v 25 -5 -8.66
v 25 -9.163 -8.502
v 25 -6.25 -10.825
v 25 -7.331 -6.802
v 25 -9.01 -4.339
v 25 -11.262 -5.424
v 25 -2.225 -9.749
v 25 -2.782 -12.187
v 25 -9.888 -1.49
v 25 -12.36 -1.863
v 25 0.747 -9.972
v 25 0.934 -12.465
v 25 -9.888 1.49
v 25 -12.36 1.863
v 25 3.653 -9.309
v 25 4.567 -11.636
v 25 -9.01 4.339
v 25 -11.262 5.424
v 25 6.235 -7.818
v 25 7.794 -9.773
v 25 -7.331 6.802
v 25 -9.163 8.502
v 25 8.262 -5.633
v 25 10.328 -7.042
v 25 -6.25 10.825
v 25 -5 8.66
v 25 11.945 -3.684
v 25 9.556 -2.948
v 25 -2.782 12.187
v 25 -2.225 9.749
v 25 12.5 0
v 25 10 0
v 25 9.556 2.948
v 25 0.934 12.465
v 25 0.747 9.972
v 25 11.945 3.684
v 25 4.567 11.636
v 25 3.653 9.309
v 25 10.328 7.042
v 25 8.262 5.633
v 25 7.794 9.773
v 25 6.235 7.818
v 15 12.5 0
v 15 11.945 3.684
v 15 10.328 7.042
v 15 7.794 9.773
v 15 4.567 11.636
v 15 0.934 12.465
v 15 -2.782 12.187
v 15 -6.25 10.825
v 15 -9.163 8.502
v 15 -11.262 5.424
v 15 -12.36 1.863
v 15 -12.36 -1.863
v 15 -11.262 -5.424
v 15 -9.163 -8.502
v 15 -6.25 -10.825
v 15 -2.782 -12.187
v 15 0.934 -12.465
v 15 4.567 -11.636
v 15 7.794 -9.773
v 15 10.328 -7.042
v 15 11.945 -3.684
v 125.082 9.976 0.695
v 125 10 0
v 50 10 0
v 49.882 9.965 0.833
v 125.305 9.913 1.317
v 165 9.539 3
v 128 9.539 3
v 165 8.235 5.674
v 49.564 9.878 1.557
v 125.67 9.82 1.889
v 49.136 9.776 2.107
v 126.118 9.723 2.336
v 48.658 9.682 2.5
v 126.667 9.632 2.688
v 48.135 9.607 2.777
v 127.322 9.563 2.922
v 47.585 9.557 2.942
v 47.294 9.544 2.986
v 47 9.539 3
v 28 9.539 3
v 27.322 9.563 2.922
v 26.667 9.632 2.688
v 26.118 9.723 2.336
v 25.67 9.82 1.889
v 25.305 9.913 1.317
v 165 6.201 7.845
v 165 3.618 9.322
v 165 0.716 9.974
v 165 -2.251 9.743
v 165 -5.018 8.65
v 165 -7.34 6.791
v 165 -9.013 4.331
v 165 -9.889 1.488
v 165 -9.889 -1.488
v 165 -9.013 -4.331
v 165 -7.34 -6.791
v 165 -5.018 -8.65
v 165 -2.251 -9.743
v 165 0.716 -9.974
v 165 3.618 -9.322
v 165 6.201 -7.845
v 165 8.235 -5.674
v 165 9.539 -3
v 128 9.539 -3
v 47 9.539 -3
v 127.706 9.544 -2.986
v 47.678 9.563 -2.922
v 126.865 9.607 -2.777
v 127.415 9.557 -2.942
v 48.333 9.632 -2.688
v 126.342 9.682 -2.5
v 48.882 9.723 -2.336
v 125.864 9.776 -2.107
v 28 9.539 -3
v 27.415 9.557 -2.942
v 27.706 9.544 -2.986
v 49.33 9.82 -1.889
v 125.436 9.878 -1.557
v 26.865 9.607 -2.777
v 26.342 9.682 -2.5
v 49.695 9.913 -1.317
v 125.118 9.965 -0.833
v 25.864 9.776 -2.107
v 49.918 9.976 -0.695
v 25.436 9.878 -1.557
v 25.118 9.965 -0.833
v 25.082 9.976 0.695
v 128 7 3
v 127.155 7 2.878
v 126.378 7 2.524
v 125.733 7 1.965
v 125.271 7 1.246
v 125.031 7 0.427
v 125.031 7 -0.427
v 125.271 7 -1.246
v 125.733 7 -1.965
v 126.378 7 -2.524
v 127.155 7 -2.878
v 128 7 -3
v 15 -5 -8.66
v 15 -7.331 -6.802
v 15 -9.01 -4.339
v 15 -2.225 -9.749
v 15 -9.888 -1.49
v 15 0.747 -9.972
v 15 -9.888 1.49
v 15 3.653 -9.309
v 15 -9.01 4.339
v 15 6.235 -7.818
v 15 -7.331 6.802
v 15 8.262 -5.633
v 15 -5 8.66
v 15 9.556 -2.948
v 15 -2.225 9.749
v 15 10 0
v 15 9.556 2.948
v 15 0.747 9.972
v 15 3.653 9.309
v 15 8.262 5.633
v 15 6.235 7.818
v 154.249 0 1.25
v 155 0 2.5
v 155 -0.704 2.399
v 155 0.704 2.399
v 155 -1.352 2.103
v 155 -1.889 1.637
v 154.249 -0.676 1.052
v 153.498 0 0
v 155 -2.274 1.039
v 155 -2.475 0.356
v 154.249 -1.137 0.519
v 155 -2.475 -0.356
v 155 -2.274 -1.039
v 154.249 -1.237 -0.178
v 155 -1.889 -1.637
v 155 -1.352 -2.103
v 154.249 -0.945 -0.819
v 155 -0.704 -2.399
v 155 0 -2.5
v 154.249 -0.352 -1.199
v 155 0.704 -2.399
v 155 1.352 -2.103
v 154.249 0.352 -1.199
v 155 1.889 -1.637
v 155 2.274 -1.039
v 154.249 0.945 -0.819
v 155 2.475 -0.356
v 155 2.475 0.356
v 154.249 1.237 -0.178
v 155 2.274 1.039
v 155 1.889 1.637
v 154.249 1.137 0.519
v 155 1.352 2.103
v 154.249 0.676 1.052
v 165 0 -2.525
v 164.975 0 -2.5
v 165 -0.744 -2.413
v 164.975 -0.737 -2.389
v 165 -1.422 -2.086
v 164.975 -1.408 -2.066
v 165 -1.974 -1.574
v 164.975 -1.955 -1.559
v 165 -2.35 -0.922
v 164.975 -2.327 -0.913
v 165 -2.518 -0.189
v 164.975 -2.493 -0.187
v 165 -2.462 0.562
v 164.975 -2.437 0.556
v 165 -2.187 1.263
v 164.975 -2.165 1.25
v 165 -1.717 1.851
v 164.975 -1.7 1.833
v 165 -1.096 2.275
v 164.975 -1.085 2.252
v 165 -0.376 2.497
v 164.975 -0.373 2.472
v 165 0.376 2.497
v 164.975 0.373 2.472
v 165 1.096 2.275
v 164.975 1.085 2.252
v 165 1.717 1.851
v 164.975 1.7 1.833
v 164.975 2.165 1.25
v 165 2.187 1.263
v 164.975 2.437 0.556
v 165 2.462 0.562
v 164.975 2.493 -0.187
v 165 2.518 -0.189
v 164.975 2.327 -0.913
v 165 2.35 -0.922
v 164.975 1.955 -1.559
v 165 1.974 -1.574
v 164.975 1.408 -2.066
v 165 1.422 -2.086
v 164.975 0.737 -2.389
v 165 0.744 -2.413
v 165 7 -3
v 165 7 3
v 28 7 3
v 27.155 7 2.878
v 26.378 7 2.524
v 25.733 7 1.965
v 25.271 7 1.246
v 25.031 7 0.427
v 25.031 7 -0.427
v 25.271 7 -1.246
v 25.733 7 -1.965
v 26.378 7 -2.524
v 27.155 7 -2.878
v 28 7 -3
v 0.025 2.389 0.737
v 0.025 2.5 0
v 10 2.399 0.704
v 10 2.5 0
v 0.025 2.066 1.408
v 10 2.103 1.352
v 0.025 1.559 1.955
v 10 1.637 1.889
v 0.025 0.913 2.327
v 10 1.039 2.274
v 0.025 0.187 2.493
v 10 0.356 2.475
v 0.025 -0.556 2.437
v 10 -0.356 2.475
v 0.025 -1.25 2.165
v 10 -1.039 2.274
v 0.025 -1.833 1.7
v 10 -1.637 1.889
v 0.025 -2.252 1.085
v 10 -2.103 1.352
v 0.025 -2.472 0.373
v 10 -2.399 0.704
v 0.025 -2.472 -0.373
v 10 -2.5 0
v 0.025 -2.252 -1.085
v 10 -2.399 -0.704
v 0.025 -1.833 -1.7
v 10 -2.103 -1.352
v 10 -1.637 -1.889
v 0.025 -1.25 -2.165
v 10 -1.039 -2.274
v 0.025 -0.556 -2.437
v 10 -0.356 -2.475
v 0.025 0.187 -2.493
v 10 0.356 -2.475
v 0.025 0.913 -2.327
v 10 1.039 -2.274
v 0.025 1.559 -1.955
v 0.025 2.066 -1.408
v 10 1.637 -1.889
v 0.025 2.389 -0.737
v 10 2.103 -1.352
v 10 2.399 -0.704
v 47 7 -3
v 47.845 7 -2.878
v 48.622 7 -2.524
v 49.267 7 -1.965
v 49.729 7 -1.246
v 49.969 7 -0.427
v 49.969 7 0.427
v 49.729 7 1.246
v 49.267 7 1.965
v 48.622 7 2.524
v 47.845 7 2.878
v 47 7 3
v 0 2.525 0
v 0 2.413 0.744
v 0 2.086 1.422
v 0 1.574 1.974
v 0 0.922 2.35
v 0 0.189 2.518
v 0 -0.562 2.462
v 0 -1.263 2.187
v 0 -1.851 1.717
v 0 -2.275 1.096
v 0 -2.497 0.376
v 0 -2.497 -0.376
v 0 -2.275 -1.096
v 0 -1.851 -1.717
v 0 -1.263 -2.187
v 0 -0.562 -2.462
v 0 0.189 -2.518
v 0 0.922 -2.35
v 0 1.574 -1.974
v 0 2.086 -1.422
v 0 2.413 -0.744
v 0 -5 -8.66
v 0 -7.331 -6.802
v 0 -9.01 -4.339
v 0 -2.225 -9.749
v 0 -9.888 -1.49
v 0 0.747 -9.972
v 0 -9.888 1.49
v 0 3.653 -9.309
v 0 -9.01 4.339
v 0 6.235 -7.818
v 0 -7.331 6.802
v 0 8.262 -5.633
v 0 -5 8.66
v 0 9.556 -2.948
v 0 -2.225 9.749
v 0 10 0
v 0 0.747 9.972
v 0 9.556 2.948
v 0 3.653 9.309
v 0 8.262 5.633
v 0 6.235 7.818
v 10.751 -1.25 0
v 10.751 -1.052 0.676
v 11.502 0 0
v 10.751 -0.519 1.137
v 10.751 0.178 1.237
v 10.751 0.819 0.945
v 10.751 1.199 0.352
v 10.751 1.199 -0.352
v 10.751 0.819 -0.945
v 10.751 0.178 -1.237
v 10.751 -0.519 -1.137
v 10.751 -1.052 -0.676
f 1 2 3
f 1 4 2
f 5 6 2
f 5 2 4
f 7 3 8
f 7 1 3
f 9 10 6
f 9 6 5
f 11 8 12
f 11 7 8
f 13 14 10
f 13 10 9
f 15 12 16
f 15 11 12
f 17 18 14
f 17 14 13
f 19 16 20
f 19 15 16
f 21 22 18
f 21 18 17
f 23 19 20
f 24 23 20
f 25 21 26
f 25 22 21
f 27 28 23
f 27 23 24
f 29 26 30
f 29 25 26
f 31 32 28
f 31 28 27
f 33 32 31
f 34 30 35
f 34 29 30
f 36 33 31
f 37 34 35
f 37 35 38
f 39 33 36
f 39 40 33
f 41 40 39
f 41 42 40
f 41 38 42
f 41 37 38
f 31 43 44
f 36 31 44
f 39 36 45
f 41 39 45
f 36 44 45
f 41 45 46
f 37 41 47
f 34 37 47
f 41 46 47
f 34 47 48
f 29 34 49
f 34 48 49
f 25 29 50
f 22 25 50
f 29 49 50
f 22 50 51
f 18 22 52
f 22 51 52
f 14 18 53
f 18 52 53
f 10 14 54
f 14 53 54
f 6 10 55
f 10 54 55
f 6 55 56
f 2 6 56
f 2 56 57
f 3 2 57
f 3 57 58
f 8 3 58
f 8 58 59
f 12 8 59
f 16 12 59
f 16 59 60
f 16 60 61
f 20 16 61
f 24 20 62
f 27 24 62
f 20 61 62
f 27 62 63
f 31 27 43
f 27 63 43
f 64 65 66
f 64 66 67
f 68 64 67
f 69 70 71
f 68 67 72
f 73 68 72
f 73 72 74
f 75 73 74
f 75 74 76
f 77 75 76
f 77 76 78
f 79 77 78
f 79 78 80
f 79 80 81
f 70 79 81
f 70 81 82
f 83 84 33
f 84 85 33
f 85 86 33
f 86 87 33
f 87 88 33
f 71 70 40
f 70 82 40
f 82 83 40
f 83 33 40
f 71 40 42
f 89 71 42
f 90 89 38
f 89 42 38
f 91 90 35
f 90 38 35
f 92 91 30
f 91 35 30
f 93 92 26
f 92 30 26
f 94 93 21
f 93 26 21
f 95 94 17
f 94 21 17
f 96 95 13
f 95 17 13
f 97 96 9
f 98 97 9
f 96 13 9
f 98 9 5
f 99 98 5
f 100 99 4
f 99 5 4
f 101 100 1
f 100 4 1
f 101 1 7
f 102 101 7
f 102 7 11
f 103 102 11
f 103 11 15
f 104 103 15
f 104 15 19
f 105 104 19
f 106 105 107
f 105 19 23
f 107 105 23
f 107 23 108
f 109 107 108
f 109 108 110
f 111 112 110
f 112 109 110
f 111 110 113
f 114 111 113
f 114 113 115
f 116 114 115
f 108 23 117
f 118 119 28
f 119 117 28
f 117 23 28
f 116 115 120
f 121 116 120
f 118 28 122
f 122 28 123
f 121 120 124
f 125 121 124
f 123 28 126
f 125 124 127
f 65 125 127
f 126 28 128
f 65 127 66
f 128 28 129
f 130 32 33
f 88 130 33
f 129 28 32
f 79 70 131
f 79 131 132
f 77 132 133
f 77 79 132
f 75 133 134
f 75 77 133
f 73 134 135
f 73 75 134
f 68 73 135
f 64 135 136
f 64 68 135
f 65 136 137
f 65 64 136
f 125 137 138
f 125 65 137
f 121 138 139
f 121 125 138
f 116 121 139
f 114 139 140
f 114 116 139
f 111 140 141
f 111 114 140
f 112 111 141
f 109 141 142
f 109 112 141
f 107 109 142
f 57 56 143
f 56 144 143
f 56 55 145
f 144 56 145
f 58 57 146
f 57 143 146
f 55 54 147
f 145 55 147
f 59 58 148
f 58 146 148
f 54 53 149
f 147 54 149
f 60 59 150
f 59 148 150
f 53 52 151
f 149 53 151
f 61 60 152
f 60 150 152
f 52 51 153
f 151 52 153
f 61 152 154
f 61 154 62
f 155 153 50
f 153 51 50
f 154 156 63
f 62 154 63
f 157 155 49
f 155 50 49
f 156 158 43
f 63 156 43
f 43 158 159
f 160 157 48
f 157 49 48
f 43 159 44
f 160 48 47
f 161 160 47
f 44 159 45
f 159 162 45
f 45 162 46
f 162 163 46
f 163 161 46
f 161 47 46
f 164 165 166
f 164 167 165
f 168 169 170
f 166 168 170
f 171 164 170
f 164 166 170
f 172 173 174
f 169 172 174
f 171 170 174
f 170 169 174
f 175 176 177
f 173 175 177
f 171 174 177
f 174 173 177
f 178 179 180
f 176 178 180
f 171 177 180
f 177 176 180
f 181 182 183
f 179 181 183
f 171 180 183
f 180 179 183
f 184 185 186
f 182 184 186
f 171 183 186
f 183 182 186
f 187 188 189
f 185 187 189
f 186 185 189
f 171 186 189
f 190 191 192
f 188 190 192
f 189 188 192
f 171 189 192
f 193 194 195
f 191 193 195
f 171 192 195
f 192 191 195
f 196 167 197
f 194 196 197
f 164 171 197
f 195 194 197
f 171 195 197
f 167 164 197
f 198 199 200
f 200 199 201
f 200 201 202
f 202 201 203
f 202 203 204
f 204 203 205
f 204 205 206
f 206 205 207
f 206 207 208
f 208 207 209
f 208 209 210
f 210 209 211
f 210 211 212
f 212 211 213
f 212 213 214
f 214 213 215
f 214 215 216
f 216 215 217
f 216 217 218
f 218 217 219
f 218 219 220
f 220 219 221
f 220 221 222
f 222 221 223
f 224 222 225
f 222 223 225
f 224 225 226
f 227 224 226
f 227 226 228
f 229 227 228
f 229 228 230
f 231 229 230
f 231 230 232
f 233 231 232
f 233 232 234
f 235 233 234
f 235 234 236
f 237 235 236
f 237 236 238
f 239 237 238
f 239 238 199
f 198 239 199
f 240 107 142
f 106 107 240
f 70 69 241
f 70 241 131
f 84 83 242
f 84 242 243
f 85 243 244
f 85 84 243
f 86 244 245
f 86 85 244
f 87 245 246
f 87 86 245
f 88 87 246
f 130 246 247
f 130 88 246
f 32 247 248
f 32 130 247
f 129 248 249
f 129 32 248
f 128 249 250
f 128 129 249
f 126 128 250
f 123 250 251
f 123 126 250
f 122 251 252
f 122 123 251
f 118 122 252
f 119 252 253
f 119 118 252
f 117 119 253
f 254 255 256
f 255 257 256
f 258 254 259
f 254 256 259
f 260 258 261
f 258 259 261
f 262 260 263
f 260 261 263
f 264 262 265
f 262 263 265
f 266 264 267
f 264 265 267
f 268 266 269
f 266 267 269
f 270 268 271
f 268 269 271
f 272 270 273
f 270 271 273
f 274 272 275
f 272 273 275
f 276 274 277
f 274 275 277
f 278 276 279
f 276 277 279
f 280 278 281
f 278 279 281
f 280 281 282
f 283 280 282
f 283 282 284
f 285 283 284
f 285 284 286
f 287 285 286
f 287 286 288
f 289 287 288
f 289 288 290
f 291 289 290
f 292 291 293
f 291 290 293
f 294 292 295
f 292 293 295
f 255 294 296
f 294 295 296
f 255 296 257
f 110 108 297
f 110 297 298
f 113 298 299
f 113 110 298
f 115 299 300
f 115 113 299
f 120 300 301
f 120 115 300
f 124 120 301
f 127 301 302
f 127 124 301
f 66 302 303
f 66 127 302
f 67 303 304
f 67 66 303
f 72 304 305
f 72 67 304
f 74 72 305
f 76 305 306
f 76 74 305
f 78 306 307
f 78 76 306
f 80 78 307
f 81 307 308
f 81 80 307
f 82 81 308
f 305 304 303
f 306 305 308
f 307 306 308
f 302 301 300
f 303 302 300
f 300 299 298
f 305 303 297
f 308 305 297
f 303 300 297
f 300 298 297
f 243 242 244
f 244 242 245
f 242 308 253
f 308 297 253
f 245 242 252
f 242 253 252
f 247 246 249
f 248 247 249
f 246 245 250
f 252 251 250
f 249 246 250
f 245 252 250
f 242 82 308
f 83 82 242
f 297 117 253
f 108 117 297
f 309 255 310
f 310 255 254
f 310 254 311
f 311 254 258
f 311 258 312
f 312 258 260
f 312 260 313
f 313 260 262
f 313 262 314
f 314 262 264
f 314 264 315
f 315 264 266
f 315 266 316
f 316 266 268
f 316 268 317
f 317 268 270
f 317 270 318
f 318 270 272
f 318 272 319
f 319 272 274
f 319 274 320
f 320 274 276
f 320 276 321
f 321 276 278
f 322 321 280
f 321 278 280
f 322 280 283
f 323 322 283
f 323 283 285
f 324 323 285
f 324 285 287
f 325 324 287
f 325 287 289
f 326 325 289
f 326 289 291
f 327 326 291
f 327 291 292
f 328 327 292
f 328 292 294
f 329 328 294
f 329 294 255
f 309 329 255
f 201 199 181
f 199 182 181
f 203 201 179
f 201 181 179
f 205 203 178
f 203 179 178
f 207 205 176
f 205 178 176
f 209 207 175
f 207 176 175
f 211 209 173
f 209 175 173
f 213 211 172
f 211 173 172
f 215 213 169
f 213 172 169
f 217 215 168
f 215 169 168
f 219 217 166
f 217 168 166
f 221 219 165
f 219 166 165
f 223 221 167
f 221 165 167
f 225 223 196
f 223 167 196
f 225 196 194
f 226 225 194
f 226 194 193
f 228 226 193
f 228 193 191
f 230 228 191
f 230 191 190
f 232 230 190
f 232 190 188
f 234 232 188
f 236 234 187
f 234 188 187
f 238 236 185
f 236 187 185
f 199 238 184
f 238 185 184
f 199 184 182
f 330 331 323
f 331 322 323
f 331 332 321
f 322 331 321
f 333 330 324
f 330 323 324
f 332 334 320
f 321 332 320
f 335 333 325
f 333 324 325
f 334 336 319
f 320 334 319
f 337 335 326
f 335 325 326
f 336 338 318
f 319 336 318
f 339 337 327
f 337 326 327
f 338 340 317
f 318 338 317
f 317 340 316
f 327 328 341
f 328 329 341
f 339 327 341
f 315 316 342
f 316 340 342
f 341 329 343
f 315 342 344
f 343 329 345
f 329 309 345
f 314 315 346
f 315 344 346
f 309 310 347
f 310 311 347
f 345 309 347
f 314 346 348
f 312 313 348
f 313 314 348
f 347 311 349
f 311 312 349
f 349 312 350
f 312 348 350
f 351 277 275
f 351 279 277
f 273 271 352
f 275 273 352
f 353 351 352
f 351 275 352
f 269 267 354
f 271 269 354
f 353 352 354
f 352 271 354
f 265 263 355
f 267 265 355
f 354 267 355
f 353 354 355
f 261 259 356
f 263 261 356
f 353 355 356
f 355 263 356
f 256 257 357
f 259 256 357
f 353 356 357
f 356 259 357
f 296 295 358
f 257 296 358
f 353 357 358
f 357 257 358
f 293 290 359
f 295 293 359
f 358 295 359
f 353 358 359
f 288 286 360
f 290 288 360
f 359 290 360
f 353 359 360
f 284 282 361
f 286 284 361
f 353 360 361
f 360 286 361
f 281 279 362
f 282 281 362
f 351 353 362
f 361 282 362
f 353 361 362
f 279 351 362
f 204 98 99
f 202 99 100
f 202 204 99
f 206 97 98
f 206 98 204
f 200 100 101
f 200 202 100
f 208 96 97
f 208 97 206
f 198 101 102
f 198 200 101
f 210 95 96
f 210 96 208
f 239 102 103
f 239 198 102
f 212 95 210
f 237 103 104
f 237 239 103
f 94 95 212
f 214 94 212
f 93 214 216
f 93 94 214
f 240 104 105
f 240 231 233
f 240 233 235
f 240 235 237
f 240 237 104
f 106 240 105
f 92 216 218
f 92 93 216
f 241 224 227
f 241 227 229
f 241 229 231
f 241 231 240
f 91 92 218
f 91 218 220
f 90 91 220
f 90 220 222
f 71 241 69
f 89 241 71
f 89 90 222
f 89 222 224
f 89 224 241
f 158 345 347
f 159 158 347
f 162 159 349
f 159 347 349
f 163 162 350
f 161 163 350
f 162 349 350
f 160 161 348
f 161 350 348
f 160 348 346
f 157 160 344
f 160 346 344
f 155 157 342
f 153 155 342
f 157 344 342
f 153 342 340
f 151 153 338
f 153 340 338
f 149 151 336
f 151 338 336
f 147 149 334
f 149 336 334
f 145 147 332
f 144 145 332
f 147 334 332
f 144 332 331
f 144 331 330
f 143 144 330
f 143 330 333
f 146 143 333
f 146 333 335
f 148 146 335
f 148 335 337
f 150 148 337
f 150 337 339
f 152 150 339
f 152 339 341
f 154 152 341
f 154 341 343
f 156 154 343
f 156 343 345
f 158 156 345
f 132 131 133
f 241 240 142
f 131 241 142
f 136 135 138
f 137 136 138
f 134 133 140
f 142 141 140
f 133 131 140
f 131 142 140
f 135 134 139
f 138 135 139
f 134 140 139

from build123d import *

# Parameters (mm, degrees)
REVOLVE_THIN1_OUTLINE_R                   = 10
REVOLVE_THIN1_DEPTH                       = 165
REVOLVE_THIN1_START                       = 15
REVOLVE_THIN1_2_OUTLINE_R                 = 12.5
REVOLVE_THIN1_2_OUTLINE_R_2               = 10
REVOLVE_THIN1_2_DEPTH                     = 10
F_5_0MM_DOWEL_HOLE1_D                     = 5
F_5_0MM_DOWEL_HOLE1_DEPTH                 = 10
F_5_0MM_DOWEL_HOLE1_CSINK_D               = 5.05
F_5_0MM_DOWEL_HOLE1_CSINK_ANGLE           = 90
F_5_0MM_DOWEL_HOLE1_TIP                   = 1.502151548
F_5_0MM_DOWEL_HOLE1_ON_FACE_2_D           = 5
F_5_0MM_DOWEL_HOLE1_ON_FACE_2_DEPTH       = 10
F_5_0MM_DOWEL_HOLE1_ON_FACE_2_CSINK_D     = 5.05
F_5_0MM_DOWEL_HOLE1_ON_FACE_2_CSINK_ANGLE = 90
F_5_0MM_DOWEL_HOLE1_ON_FACE_2_TIP         = 1.502151548
CUT_EXTRUDE1_DEPTH                        = 3


# Read off the part's stored shape, not the designer's step: Revolve-Thin1
with BuildPart() as part:
    # Revolve-Thin1 outline → Revolve-Thin1 (new body)
    with BuildSketch(Plane.YZ):
        Circle(REVOLVE_THIN1_OUTLINE_R)
    extrude(amount=REVOLVE_THIN1_DEPTH)

    # Revolve-Thin1 2 outline → Revolve-Thin1 2 (add)
    with BuildSketch(Plane.YZ.offset(REVOLVE_THIN1_START)):
        Circle(REVOLVE_THIN1_2_OUTLINE_R)
        Circle(REVOLVE_THIN1_2_OUTLINE_R_2, mode=Mode.SUBTRACT)
    extrude(amount=REVOLVE_THIN1_2_DEPTH)

    # Ø5.0mm Dowel Hole1
    with Locations(Plane(origin=(0, 0, 0), x_dir=(0, -1, 0), z_dir=(-1, 0, 0))):
        with Locations((0, 0)):
            CounterSinkHole(F_5_0MM_DOWEL_HOLE1_D / 2, F_5_0MM_DOWEL_HOLE1_CSINK_D / 2, depth=F_5_0MM_DOWEL_HOLE1_DEPTH, counter_sink_angle=F_5_0MM_DOWEL_HOLE1_CSINK_ANGLE)
            with Locations((0, 0, -(F_5_0MM_DOWEL_HOLE1_DEPTH + F_5_0MM_DOWEL_HOLE1_TIP / 2))):  # 118° drill point
                Cone(0, F_5_0MM_DOWEL_HOLE1_D / 2, F_5_0MM_DOWEL_HOLE1_TIP, mode=Mode.SUBTRACT)

    # Ø5.0mm Dowel Hole1 on face 2
    with Locations(Plane(origin=(165, 0, 0), x_dir=(0, 0, 1), z_dir=(1, 0, 0))):
        with Locations((0, 0)):
            CounterSinkHole(F_5_0MM_DOWEL_HOLE1_ON_FACE_2_D / 2, F_5_0MM_DOWEL_HOLE1_ON_FACE_2_CSINK_D / 2, depth=F_5_0MM_DOWEL_HOLE1_ON_FACE_2_DEPTH, counter_sink_angle=F_5_0MM_DOWEL_HOLE1_ON_FACE_2_CSINK_ANGLE)
            with Locations((0, 0, -(F_5_0MM_DOWEL_HOLE1_ON_FACE_2_DEPTH + F_5_0MM_DOWEL_HOLE1_ON_FACE_2_TIP / 2))):  # 118° drill point
                Cone(0, F_5_0MM_DOWEL_HOLE1_ON_FACE_2_D / 2, F_5_0MM_DOWEL_HOLE1_ON_FACE_2_TIP, mode=Mode.SUBTRACT)

    # Sketch3 → Cut-Extrude1 (cut)
    with BuildSketch(Plane(origin=(0, 10, 0), x_dir=(1, 0, 0), z_dir=(0, 1, 0))):
        with BuildLine():
            Line((28, 3), (47, 3))
            ThreePointArc((47, 3), (50, 0), (47, -3))
            Line((47, -3), (28, -3))
            ThreePointArc((28, -3), (25, 0), (28, 3))
        make_face()
        with BuildLine():
            Line((165, -3), (128, -3))
            ThreePointArc((128, -3), (125, 0), (128, 3))
            Line((128, 3), (165, 3))
            ThreePointArc((165, 3), (168, 0), (165, -3))
        make_face()
    extrude(amount=-CUT_EXTRUDE1_DEPTH, mode=Mode.SUBTRACT)


solid = part.part
